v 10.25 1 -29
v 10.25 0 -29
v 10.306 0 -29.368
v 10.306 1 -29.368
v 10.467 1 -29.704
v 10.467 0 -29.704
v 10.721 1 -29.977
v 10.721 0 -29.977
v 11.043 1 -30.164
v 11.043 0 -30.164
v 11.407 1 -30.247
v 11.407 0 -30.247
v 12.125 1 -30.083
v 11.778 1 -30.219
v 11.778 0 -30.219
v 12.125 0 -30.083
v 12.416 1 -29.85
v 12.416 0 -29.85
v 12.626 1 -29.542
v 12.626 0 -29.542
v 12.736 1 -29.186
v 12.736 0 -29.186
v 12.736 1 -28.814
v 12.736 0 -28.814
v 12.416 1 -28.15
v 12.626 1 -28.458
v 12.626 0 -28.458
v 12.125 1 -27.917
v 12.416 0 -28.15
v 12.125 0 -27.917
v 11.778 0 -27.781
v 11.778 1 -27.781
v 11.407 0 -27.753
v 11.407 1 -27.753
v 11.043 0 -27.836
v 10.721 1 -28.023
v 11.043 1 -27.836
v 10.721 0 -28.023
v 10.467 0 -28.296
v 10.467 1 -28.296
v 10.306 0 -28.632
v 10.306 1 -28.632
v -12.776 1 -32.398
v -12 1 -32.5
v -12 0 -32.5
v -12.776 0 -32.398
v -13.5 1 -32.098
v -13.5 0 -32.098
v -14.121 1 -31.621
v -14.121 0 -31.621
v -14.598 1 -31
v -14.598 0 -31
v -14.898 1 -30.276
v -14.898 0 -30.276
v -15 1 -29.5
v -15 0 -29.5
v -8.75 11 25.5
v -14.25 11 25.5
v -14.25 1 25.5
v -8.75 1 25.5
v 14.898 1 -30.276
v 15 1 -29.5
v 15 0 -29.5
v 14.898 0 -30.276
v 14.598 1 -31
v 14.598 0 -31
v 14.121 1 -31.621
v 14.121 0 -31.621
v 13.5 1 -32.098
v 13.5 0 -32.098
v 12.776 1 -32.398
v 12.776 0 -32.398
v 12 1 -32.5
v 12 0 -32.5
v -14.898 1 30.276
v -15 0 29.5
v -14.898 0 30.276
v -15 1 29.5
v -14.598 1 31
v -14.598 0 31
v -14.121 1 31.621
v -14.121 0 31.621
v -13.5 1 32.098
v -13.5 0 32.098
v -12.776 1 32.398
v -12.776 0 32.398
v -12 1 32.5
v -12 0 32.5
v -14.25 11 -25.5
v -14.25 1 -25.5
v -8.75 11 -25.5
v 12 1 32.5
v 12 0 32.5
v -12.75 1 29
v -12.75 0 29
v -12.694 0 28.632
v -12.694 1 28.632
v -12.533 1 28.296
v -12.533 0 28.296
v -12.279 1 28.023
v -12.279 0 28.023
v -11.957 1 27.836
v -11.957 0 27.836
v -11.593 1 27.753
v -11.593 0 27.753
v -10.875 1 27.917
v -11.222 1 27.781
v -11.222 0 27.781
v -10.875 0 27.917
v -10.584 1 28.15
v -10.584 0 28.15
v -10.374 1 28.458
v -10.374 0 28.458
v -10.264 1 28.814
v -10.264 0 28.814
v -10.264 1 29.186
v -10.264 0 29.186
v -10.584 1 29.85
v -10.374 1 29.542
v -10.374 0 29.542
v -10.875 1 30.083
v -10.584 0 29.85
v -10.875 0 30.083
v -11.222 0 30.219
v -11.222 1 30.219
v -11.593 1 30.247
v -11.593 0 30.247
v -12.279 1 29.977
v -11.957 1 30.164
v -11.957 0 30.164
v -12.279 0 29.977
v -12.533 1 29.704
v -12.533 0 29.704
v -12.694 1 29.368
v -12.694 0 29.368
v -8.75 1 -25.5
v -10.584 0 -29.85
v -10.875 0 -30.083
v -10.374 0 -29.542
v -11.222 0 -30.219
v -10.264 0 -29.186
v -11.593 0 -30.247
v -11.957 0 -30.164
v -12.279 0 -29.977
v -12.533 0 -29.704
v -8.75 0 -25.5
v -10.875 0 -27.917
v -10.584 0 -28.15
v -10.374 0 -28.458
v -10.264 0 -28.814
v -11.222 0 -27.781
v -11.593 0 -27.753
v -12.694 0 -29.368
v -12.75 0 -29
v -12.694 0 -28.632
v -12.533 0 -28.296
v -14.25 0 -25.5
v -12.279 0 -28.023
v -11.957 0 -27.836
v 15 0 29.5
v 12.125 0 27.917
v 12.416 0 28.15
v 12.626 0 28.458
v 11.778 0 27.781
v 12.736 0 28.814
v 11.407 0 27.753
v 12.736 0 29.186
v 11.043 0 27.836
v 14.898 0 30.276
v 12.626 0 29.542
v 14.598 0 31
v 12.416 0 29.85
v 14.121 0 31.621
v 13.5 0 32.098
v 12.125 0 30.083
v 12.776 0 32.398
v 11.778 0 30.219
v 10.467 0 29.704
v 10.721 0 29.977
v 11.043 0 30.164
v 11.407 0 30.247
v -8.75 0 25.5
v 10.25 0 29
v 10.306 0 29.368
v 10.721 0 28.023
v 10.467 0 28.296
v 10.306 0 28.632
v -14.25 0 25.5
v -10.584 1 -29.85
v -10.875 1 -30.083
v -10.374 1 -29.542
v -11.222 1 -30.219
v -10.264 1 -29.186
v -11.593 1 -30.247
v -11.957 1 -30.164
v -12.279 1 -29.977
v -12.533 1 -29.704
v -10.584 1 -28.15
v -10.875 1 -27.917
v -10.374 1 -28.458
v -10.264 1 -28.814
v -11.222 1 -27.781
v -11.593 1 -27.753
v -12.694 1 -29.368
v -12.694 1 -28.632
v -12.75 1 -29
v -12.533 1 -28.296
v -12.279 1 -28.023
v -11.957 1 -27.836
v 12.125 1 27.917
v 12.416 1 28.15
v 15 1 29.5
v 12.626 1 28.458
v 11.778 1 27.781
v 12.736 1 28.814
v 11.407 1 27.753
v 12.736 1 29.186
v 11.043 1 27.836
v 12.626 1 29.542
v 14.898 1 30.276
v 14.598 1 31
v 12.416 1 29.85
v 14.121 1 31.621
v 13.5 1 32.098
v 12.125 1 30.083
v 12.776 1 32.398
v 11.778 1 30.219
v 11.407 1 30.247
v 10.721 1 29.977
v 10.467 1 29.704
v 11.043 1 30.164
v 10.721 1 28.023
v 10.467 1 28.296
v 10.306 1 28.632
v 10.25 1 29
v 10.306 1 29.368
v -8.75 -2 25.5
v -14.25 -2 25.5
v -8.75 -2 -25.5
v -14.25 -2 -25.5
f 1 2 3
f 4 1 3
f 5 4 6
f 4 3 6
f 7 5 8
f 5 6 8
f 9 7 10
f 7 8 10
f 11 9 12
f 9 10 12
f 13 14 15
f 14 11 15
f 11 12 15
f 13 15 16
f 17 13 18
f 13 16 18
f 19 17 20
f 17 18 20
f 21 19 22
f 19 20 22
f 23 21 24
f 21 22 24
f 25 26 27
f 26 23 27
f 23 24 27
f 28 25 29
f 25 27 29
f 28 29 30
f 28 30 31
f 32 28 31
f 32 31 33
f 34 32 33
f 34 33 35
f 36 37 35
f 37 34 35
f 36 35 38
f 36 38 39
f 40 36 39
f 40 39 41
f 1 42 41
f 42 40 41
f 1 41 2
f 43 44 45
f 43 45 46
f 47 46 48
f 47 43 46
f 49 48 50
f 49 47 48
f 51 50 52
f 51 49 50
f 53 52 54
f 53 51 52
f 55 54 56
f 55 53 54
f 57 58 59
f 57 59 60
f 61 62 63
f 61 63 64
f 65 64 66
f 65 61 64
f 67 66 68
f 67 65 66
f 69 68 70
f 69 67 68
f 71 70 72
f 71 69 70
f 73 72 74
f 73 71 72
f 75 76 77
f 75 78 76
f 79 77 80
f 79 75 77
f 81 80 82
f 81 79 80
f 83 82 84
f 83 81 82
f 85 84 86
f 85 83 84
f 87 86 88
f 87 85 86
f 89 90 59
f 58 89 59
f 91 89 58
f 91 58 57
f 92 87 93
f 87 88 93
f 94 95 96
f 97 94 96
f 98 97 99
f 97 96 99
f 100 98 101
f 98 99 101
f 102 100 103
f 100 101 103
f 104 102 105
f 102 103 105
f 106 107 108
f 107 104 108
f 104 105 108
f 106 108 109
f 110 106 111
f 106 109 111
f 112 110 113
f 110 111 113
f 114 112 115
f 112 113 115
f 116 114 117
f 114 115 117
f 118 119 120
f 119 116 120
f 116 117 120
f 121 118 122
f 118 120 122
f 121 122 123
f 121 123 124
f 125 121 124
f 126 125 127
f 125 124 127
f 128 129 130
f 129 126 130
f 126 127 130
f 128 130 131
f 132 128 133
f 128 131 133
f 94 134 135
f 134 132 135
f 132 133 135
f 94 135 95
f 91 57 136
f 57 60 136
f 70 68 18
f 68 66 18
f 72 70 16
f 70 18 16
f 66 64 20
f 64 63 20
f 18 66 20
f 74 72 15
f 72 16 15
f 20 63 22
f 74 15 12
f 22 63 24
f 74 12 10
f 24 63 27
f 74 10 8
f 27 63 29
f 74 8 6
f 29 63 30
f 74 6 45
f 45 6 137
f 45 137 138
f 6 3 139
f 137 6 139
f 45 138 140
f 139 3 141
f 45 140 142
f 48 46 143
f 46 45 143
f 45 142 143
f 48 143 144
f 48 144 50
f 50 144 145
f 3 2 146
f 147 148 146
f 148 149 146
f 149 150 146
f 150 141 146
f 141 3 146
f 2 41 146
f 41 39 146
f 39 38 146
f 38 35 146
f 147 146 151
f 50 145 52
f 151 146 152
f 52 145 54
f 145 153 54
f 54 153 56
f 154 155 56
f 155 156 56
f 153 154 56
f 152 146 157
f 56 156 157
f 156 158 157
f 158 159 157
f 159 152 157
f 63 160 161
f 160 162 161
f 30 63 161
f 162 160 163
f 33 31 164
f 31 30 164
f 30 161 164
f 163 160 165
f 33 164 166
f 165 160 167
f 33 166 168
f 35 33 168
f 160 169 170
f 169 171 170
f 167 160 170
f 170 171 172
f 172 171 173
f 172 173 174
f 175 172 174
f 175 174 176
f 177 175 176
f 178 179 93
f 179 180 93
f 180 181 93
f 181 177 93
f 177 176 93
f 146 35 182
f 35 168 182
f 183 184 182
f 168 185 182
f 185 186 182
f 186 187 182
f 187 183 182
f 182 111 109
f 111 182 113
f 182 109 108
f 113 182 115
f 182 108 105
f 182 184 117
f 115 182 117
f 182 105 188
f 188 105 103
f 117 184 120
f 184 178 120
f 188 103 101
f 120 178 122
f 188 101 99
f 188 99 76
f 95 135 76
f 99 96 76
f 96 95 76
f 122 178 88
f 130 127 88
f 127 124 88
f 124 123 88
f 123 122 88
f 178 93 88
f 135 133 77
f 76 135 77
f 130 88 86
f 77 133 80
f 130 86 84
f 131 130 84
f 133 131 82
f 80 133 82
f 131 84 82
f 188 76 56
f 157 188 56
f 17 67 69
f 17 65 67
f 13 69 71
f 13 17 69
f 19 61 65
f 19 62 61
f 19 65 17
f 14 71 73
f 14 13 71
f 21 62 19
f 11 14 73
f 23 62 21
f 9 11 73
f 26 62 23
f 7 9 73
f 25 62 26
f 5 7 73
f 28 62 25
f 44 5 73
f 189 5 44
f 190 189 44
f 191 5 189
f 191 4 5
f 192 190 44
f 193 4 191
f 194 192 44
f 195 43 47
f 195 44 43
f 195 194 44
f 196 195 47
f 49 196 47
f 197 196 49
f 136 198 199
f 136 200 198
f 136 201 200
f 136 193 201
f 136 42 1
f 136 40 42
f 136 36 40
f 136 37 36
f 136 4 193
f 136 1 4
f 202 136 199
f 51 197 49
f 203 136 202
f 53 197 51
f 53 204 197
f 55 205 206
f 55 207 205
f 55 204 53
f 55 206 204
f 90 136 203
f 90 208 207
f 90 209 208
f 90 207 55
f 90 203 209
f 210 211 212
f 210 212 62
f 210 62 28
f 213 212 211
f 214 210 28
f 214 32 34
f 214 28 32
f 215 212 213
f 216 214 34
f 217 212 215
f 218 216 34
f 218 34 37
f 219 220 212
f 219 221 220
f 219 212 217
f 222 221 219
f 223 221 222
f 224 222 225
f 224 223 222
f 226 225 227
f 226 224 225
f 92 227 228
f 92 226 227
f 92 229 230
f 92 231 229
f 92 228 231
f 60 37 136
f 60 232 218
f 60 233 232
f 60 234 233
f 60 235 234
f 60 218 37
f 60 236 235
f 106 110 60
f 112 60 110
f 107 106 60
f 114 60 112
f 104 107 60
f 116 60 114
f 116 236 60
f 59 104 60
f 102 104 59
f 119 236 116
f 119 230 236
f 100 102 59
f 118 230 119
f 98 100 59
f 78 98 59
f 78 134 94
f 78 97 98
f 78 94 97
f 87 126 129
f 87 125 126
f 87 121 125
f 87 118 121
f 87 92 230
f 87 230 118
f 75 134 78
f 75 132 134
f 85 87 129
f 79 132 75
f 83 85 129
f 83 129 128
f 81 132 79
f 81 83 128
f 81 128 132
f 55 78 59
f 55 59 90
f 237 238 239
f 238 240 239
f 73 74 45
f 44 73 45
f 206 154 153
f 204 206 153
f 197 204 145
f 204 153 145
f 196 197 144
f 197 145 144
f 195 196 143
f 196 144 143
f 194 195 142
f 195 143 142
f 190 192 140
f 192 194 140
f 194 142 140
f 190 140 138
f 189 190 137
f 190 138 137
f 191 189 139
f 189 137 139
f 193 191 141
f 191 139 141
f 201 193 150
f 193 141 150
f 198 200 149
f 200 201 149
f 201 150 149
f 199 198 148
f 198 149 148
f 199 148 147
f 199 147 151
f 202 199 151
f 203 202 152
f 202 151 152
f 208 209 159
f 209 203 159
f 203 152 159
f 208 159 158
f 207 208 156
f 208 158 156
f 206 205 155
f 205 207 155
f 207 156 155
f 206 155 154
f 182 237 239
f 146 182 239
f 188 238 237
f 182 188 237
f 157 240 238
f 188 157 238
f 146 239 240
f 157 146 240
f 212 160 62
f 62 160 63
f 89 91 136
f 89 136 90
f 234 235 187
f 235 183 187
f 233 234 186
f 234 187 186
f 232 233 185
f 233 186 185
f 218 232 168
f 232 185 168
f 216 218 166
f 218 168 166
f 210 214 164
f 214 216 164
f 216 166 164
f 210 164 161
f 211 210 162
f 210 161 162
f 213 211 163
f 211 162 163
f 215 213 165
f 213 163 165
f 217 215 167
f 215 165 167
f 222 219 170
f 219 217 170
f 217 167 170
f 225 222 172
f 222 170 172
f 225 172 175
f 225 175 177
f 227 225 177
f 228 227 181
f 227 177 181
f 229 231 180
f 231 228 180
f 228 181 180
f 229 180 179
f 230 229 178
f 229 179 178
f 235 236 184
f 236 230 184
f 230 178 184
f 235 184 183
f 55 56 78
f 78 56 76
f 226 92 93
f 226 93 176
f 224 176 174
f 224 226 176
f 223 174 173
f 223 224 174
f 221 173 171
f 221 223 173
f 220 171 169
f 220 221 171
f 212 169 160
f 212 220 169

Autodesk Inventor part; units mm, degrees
ref_plane "YZ Plane" through (0, 0, 0) normal (1, 0, 0) x (0, 1, 0)
ref_plane "XZ Plane" through (0, 0, 0) normal (0, 1, 0) x (-1, 0, 0)
ref_plane "XY Plane" through (0, 0, 0) normal (0, 0, 1) x (1, 0, 0)
sketch "Sketch1" plane through (0, 0, 0) normal (0, 1, 0) x (-1, 0, 0)
  line L0 (15, 32.5) -> (-15, 32.5)
  line L1 (-15, 32.5) -> (-15, -32.5)
  line L2 (-15, -32.5) -> (15, -32.5)
  line L3 (15, -32.5) -> (15, 32.5)
  line L4 (15, 32.5) -> (-15, -32.5) construction
  line L5 (-15, 32.5) -> (15, -32.5) construction
  line L6 (11.5, 29) -> (-11.5, 29) construction
  line L7 (-11.5, 29) -> (-11.5, -29) construction
  line L8 (-11.5, -29) -> (11.5, -29) construction
  line L9 (11.5, -29) -> (11.5, 29) construction
  line L10 (11.5, 29) -> (-11.5, -29) construction
  line L11 (-11.5, 29) -> (11.5, -29) construction
  circle A0 centre (11.5, 29) radius 1.25
  circle A1 centre (11.5, -29) radius 1.25
  circle A2 centre (-11.5, -29) radius 1.25
  circle A3 centre (-11.5, 29) radius 1.25
  point P0 (0, 0)
  dimension "d0" = 30
  dimension "d1" = 65
  dimension "d2" = 23
  dimension "d3" = 58
  dimension "d4" = 2.5
  dimension "d5" = 2.5
  dimension "d6" = 2.5
  dimension "d7" = 2.5
extrude "Extrusion1" add sketch "Sketch1" along normal blind 1
fillet "Fillet1" radius 3 4 edges at (-15, 0.5, 32.5) (15, 0.5, 32.5) (15, 0.5, -32.5) (-15, 0.5, -32.5)
sketch "Sketch2" plane through (0, 1, 0) normal (0, 1, 0) x (1, 0, 0)
  line L0 (-14.25, -25.5) -> (-8.75, -25.5)
  line L1 (-8.75, -25.5) -> (-8.75, 25.5)
  line L2 (-8.75, 25.5) -> (-14.25, 25.5)
  line L3 (-14.25, 25.5) -> (-14.25, -25.5)
  line L4 (-14.25, -25.5) -> (-8.75, 25.5) construction
  line L5 (-8.75, -25.5) -> (-14.25, 25.5) construction
  line L6 (-15, 29.5) -> (-15, -29.5) projected
  point P0 (0, 0)
  point P1 (-11.5, 0)
  dimension "d11" = 5.5
  dimension "d12" = 51
  dimension "d13" = 3.5
extrude "Extrusion2" add sketch "Sketch2" along normal blind 10 and the other way blind 3
properties part number "raspberry"
